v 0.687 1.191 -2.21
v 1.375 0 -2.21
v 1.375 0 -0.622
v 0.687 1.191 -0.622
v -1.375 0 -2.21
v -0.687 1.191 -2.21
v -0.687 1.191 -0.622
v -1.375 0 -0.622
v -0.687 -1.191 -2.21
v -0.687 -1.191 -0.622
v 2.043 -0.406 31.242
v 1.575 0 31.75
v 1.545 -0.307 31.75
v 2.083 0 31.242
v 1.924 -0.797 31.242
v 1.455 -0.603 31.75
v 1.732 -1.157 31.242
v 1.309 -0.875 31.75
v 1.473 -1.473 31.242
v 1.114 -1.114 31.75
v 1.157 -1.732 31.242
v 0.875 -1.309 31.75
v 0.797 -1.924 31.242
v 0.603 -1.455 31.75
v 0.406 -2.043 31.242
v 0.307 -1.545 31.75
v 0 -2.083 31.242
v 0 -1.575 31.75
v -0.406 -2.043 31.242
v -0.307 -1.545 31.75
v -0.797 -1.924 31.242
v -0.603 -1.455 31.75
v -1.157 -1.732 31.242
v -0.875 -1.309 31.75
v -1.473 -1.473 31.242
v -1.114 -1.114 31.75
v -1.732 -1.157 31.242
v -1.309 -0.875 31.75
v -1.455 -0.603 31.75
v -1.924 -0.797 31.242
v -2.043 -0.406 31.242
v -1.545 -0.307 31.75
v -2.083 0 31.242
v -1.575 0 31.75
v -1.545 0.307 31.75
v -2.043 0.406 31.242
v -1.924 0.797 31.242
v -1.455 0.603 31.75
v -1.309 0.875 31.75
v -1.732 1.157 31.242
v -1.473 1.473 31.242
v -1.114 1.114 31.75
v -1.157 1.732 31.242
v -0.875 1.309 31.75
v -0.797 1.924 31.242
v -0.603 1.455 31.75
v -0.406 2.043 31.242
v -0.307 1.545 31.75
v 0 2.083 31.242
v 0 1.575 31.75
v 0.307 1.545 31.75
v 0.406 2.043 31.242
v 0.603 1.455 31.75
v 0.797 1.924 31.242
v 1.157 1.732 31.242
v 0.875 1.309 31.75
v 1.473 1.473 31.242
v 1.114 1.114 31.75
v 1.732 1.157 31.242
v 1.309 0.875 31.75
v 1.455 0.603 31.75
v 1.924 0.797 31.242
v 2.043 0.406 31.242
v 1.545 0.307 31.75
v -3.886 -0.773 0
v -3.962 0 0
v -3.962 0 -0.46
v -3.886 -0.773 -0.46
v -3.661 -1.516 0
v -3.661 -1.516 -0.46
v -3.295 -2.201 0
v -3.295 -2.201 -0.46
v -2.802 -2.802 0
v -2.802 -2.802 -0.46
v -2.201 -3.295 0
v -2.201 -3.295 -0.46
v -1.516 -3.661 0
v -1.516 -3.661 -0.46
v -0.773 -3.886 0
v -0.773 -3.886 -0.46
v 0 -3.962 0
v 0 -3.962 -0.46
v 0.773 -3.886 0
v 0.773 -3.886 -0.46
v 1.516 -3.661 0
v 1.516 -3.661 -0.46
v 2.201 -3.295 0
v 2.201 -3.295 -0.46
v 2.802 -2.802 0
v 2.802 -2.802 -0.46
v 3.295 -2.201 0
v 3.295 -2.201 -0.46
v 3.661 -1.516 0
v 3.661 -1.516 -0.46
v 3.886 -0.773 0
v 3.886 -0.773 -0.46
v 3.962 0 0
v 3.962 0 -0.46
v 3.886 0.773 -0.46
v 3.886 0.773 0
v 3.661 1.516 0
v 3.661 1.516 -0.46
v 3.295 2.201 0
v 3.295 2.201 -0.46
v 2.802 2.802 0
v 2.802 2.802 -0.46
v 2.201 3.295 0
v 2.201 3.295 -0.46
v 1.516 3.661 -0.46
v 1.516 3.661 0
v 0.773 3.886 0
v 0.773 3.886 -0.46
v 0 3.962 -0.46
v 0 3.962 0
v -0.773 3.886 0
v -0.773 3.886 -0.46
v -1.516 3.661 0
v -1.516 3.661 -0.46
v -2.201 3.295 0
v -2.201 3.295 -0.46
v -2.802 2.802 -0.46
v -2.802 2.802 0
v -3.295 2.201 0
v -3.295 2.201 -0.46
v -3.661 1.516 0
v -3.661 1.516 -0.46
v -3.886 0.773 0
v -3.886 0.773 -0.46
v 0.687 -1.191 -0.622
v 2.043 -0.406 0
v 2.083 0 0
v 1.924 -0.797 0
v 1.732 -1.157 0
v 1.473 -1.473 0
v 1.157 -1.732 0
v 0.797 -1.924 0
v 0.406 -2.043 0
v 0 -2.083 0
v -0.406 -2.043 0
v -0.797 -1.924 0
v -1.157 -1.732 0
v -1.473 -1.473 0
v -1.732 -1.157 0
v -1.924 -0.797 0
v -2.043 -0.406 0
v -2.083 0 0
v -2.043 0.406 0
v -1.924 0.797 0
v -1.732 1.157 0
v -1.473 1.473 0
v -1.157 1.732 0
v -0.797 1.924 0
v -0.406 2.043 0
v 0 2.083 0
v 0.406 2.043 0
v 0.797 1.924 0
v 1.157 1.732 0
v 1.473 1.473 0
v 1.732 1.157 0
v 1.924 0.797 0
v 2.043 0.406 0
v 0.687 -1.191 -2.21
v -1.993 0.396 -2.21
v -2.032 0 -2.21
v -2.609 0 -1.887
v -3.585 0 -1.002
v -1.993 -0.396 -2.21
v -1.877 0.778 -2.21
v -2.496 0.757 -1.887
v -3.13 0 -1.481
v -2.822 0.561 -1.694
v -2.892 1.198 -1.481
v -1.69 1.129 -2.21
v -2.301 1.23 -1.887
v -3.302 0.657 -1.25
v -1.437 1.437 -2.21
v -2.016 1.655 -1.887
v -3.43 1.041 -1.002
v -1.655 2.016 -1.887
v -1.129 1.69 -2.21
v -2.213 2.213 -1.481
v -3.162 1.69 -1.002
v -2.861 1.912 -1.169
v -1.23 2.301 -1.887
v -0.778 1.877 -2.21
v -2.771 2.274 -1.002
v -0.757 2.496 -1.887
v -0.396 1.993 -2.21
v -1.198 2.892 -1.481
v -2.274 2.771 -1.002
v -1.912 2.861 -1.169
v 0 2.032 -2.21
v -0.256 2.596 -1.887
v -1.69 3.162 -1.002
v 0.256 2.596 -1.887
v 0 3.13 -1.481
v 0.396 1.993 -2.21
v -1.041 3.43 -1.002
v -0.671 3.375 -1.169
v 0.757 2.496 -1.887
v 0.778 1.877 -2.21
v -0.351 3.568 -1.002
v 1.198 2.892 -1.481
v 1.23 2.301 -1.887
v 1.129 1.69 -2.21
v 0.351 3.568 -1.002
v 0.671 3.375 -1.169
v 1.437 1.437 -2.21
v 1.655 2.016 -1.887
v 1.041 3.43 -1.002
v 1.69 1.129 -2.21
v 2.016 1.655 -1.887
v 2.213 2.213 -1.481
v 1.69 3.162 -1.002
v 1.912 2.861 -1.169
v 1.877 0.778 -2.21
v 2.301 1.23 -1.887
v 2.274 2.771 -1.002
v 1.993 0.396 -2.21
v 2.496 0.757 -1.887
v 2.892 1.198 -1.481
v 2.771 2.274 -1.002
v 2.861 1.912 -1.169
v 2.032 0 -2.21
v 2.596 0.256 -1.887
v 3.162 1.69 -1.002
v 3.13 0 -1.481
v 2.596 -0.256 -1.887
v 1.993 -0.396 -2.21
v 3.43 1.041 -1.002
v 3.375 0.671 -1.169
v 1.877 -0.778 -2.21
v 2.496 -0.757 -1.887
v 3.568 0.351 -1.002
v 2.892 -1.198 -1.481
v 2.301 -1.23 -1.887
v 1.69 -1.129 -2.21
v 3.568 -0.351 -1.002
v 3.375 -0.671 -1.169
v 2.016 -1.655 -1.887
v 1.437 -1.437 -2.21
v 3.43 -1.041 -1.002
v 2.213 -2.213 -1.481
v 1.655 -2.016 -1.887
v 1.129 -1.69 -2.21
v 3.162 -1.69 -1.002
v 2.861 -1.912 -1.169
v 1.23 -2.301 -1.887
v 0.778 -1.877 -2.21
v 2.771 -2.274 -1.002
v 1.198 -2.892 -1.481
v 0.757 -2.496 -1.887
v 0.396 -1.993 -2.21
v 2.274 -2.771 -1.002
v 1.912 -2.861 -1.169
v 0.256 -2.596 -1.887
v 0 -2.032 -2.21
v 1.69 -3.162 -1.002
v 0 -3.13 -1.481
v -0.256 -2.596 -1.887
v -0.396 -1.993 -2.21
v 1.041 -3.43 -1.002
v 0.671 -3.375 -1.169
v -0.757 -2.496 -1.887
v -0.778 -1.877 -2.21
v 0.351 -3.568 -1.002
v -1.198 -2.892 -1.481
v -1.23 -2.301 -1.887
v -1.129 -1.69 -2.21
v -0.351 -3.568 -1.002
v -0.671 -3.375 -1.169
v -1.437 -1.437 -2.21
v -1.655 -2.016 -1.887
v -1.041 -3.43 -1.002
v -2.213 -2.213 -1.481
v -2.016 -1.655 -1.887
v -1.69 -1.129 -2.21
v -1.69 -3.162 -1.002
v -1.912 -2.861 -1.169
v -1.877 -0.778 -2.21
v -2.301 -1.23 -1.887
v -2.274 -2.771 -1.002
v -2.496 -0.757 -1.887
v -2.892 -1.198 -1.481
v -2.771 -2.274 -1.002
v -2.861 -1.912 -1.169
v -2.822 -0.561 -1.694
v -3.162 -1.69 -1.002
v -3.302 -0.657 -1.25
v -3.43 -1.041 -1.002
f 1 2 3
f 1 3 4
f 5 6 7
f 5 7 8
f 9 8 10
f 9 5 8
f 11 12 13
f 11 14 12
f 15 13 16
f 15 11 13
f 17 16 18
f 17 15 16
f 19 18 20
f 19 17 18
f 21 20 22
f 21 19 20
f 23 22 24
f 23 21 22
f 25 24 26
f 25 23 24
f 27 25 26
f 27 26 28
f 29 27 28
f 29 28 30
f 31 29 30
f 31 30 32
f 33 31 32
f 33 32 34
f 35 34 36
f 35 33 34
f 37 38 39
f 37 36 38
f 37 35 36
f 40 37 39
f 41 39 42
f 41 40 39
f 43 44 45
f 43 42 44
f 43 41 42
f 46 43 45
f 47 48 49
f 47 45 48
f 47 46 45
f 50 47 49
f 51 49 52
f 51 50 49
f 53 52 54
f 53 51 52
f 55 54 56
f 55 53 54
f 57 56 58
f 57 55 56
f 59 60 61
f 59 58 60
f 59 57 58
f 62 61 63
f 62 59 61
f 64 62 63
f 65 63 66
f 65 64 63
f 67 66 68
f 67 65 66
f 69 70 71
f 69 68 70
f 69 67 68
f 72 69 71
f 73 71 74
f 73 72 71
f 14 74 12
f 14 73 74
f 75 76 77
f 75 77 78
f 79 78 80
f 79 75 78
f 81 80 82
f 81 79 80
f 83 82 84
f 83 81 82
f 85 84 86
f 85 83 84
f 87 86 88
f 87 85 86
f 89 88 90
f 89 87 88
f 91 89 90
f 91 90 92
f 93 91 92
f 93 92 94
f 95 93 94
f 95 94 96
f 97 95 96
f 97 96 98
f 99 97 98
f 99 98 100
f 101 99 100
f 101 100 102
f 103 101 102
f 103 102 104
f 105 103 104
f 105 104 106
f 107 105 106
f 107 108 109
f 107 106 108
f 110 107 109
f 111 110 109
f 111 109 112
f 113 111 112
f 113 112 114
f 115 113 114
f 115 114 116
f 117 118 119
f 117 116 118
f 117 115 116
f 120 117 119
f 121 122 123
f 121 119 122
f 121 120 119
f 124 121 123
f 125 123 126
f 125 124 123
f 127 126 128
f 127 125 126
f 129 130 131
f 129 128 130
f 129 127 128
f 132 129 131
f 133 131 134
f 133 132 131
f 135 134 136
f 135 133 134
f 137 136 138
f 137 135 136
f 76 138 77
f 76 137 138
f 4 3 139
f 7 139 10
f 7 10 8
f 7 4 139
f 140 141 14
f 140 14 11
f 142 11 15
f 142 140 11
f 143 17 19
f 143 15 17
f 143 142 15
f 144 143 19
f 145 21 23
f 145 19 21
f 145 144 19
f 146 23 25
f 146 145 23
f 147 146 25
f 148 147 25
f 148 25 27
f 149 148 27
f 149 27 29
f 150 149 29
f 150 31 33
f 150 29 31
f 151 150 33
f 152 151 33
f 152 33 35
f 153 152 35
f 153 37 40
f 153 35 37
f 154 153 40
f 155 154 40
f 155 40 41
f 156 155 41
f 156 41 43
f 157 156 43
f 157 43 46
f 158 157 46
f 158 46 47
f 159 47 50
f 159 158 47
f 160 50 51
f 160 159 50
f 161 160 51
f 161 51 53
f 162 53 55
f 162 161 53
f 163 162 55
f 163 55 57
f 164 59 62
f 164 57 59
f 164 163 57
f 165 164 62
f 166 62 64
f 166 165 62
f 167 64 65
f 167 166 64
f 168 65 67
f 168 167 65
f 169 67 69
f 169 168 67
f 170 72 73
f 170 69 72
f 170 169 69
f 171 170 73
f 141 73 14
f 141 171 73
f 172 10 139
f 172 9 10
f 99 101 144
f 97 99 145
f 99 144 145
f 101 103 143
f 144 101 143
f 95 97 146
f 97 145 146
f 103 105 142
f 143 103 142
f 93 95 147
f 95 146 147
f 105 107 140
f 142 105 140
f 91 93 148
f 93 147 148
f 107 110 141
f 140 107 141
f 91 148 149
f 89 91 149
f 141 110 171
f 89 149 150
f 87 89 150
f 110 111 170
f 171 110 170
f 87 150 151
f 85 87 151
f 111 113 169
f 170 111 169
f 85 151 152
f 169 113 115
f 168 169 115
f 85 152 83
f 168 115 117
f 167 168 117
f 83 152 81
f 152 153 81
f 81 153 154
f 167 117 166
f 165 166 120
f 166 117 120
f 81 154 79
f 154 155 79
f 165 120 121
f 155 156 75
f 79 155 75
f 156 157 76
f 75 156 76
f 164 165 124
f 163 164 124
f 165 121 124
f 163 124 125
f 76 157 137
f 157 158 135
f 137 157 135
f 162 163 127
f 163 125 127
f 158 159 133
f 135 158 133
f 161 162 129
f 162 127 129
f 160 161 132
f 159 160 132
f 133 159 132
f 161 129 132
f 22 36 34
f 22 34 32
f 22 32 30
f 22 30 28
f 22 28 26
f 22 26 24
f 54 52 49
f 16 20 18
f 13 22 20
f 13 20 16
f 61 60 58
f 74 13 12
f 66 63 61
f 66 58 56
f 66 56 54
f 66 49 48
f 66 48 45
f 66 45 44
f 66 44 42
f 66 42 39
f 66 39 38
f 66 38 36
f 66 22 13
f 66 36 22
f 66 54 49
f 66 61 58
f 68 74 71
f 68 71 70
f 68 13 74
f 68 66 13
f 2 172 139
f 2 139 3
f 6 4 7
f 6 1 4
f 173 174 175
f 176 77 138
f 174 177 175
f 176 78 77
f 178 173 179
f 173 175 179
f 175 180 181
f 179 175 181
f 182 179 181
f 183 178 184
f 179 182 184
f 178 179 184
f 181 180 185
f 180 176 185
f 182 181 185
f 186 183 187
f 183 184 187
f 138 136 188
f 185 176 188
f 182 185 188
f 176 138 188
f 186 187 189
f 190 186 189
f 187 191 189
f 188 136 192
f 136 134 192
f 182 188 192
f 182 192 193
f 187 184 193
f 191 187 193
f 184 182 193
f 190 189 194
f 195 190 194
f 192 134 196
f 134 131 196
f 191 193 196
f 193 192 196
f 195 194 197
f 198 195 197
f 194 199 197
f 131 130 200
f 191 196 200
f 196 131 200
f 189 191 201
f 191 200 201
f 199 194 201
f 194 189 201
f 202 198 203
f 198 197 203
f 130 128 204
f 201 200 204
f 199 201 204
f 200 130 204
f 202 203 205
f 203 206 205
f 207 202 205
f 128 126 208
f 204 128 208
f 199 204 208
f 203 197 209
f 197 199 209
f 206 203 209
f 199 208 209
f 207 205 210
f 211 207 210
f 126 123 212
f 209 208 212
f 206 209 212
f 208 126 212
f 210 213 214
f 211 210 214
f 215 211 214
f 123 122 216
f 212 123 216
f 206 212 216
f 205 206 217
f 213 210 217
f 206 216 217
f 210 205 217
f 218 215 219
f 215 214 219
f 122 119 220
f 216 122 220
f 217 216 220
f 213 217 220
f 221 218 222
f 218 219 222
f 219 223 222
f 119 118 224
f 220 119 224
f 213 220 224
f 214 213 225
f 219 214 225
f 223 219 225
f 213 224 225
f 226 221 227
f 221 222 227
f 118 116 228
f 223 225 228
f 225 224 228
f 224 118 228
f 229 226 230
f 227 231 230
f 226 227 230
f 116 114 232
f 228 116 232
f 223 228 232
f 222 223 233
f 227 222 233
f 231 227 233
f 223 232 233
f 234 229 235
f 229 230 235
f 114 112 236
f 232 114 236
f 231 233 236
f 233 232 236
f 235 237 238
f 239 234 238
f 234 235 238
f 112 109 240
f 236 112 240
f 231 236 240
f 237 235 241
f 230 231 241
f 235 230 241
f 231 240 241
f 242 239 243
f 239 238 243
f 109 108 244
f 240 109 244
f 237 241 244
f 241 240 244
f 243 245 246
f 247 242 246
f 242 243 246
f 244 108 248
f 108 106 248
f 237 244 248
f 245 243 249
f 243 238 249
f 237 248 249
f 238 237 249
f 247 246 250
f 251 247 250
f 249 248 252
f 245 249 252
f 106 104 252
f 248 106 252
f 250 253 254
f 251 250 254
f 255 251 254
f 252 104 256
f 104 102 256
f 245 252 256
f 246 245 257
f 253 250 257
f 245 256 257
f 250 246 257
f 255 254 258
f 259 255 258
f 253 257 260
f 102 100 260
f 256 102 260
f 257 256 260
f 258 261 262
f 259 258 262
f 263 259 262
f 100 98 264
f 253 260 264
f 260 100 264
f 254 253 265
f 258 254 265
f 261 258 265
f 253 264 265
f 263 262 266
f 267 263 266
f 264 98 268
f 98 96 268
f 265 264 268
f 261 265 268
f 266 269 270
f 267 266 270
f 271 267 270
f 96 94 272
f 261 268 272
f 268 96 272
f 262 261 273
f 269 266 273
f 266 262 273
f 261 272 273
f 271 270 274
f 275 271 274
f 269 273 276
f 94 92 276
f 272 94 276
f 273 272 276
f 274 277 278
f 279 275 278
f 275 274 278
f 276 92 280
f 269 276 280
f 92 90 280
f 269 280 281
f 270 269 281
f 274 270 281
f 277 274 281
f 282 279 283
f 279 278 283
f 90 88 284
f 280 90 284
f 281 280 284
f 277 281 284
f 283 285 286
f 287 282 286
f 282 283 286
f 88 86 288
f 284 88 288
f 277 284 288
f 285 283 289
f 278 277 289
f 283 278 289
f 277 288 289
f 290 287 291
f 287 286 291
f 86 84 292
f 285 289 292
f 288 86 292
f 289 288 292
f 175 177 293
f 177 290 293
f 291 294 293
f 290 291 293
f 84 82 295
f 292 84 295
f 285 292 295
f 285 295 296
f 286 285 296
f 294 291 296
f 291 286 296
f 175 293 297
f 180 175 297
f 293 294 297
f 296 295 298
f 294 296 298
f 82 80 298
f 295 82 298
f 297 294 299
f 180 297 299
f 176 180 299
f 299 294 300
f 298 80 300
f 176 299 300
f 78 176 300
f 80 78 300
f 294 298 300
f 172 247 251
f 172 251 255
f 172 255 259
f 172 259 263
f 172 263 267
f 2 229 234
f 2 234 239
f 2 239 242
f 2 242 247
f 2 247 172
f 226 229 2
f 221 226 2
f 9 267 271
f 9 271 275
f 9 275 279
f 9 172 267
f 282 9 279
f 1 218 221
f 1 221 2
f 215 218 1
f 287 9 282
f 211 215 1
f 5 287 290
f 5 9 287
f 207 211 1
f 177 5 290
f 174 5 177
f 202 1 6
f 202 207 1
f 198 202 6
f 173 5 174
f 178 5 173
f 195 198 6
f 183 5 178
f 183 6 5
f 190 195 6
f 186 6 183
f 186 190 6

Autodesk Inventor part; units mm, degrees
ref_plane "YZ Plane" through (0, 0, 0) normal (1, 0, 0) x (0, 1, 0)
ref_plane "XZ Plane" through (0, 0, 0) normal (0, 1, 0) x (-1, 0, 0)
ref_plane "XY Plane" through (0, 0, 0) normal (0, 0, 1) x (1, 0, 0)
sketch "Sketch1" plane through (0, 0, 0) normal (0, 0, 1) x (1, 0, 0)
  circle A0 centre (0, 0) radius 2.0828
  dimension "d0" = 4.1656
extrude "Extrusion1" add sketch "Sketch1" along normal blind 31.75
sketch "Sketch2" plane through (0, 0, 0) normal (0, 1, 0) x (-1, 0, 0)
  line L0 (0, 0) -> (0, -2.2098)
  line L1 (0, 0) -> (3.9624, 0)
  line L2 (0, -2.2098) -> (2.032, -2.2098)
  line L3 (3.9624, 0) -> (3.9624, 3.6562) construction
  arc A0 (2.032, -2.2098) -> (3.9624, -0.4599) centre (0.1837, 1.7689) ccw
  line L4 (4.5847, 0.6553) -> (4.5847, -0.2608) construction
  line L5 (3.9624, -0.4599) -> (3.9624, 0)
  dimension "d3" = 2.2098
  dimension "d6" = 2.032
  dimension "d19" = 3.9624
revolve "Revolution1" add sketch "Sketch2" angle 360 about axis through (0, 0, 0) along (0, 0, -1)
sketch "Sketch3" plane through (0, 0, -2.2098) normal (0, 0, -1) x (-1, 0, 0)
  circle A0 centre (0, 0) radius 2.032 projected
  line L0 (-0.6874, 1.1906) -> (0.6874, 1.1906)
  line L1 (0.6874, 1.1906) -> (1.3748, 0)
  line L2 (1.3748, 0) -> (0.6874, -1.1906)
  line L3 (0.6874, -1.1906) -> (-0.6874, -1.1906)
  line L4 (-0.6874, -1.1906) -> (-1.3748, 0)
  line L5 (-1.3748, 0) -> (-0.6874, 1.1906)
  dimension "d8" = 2.3813
extrude "Extrusion2" cut sketch "Sketch3" against normal blind 1.5875 contours L0 L1 L2 L3 L4 L5
chamfer "Chamfer1" distance 0.508 angle 45 1 edges at (-2.0828, 0, 31.75)
thread "Thread1" size "8-32 UNC" class "2A" standard "ANSI Unified Screw Threads" length 25.4
properties part number "10-32 x500 button head" material "Steel"
